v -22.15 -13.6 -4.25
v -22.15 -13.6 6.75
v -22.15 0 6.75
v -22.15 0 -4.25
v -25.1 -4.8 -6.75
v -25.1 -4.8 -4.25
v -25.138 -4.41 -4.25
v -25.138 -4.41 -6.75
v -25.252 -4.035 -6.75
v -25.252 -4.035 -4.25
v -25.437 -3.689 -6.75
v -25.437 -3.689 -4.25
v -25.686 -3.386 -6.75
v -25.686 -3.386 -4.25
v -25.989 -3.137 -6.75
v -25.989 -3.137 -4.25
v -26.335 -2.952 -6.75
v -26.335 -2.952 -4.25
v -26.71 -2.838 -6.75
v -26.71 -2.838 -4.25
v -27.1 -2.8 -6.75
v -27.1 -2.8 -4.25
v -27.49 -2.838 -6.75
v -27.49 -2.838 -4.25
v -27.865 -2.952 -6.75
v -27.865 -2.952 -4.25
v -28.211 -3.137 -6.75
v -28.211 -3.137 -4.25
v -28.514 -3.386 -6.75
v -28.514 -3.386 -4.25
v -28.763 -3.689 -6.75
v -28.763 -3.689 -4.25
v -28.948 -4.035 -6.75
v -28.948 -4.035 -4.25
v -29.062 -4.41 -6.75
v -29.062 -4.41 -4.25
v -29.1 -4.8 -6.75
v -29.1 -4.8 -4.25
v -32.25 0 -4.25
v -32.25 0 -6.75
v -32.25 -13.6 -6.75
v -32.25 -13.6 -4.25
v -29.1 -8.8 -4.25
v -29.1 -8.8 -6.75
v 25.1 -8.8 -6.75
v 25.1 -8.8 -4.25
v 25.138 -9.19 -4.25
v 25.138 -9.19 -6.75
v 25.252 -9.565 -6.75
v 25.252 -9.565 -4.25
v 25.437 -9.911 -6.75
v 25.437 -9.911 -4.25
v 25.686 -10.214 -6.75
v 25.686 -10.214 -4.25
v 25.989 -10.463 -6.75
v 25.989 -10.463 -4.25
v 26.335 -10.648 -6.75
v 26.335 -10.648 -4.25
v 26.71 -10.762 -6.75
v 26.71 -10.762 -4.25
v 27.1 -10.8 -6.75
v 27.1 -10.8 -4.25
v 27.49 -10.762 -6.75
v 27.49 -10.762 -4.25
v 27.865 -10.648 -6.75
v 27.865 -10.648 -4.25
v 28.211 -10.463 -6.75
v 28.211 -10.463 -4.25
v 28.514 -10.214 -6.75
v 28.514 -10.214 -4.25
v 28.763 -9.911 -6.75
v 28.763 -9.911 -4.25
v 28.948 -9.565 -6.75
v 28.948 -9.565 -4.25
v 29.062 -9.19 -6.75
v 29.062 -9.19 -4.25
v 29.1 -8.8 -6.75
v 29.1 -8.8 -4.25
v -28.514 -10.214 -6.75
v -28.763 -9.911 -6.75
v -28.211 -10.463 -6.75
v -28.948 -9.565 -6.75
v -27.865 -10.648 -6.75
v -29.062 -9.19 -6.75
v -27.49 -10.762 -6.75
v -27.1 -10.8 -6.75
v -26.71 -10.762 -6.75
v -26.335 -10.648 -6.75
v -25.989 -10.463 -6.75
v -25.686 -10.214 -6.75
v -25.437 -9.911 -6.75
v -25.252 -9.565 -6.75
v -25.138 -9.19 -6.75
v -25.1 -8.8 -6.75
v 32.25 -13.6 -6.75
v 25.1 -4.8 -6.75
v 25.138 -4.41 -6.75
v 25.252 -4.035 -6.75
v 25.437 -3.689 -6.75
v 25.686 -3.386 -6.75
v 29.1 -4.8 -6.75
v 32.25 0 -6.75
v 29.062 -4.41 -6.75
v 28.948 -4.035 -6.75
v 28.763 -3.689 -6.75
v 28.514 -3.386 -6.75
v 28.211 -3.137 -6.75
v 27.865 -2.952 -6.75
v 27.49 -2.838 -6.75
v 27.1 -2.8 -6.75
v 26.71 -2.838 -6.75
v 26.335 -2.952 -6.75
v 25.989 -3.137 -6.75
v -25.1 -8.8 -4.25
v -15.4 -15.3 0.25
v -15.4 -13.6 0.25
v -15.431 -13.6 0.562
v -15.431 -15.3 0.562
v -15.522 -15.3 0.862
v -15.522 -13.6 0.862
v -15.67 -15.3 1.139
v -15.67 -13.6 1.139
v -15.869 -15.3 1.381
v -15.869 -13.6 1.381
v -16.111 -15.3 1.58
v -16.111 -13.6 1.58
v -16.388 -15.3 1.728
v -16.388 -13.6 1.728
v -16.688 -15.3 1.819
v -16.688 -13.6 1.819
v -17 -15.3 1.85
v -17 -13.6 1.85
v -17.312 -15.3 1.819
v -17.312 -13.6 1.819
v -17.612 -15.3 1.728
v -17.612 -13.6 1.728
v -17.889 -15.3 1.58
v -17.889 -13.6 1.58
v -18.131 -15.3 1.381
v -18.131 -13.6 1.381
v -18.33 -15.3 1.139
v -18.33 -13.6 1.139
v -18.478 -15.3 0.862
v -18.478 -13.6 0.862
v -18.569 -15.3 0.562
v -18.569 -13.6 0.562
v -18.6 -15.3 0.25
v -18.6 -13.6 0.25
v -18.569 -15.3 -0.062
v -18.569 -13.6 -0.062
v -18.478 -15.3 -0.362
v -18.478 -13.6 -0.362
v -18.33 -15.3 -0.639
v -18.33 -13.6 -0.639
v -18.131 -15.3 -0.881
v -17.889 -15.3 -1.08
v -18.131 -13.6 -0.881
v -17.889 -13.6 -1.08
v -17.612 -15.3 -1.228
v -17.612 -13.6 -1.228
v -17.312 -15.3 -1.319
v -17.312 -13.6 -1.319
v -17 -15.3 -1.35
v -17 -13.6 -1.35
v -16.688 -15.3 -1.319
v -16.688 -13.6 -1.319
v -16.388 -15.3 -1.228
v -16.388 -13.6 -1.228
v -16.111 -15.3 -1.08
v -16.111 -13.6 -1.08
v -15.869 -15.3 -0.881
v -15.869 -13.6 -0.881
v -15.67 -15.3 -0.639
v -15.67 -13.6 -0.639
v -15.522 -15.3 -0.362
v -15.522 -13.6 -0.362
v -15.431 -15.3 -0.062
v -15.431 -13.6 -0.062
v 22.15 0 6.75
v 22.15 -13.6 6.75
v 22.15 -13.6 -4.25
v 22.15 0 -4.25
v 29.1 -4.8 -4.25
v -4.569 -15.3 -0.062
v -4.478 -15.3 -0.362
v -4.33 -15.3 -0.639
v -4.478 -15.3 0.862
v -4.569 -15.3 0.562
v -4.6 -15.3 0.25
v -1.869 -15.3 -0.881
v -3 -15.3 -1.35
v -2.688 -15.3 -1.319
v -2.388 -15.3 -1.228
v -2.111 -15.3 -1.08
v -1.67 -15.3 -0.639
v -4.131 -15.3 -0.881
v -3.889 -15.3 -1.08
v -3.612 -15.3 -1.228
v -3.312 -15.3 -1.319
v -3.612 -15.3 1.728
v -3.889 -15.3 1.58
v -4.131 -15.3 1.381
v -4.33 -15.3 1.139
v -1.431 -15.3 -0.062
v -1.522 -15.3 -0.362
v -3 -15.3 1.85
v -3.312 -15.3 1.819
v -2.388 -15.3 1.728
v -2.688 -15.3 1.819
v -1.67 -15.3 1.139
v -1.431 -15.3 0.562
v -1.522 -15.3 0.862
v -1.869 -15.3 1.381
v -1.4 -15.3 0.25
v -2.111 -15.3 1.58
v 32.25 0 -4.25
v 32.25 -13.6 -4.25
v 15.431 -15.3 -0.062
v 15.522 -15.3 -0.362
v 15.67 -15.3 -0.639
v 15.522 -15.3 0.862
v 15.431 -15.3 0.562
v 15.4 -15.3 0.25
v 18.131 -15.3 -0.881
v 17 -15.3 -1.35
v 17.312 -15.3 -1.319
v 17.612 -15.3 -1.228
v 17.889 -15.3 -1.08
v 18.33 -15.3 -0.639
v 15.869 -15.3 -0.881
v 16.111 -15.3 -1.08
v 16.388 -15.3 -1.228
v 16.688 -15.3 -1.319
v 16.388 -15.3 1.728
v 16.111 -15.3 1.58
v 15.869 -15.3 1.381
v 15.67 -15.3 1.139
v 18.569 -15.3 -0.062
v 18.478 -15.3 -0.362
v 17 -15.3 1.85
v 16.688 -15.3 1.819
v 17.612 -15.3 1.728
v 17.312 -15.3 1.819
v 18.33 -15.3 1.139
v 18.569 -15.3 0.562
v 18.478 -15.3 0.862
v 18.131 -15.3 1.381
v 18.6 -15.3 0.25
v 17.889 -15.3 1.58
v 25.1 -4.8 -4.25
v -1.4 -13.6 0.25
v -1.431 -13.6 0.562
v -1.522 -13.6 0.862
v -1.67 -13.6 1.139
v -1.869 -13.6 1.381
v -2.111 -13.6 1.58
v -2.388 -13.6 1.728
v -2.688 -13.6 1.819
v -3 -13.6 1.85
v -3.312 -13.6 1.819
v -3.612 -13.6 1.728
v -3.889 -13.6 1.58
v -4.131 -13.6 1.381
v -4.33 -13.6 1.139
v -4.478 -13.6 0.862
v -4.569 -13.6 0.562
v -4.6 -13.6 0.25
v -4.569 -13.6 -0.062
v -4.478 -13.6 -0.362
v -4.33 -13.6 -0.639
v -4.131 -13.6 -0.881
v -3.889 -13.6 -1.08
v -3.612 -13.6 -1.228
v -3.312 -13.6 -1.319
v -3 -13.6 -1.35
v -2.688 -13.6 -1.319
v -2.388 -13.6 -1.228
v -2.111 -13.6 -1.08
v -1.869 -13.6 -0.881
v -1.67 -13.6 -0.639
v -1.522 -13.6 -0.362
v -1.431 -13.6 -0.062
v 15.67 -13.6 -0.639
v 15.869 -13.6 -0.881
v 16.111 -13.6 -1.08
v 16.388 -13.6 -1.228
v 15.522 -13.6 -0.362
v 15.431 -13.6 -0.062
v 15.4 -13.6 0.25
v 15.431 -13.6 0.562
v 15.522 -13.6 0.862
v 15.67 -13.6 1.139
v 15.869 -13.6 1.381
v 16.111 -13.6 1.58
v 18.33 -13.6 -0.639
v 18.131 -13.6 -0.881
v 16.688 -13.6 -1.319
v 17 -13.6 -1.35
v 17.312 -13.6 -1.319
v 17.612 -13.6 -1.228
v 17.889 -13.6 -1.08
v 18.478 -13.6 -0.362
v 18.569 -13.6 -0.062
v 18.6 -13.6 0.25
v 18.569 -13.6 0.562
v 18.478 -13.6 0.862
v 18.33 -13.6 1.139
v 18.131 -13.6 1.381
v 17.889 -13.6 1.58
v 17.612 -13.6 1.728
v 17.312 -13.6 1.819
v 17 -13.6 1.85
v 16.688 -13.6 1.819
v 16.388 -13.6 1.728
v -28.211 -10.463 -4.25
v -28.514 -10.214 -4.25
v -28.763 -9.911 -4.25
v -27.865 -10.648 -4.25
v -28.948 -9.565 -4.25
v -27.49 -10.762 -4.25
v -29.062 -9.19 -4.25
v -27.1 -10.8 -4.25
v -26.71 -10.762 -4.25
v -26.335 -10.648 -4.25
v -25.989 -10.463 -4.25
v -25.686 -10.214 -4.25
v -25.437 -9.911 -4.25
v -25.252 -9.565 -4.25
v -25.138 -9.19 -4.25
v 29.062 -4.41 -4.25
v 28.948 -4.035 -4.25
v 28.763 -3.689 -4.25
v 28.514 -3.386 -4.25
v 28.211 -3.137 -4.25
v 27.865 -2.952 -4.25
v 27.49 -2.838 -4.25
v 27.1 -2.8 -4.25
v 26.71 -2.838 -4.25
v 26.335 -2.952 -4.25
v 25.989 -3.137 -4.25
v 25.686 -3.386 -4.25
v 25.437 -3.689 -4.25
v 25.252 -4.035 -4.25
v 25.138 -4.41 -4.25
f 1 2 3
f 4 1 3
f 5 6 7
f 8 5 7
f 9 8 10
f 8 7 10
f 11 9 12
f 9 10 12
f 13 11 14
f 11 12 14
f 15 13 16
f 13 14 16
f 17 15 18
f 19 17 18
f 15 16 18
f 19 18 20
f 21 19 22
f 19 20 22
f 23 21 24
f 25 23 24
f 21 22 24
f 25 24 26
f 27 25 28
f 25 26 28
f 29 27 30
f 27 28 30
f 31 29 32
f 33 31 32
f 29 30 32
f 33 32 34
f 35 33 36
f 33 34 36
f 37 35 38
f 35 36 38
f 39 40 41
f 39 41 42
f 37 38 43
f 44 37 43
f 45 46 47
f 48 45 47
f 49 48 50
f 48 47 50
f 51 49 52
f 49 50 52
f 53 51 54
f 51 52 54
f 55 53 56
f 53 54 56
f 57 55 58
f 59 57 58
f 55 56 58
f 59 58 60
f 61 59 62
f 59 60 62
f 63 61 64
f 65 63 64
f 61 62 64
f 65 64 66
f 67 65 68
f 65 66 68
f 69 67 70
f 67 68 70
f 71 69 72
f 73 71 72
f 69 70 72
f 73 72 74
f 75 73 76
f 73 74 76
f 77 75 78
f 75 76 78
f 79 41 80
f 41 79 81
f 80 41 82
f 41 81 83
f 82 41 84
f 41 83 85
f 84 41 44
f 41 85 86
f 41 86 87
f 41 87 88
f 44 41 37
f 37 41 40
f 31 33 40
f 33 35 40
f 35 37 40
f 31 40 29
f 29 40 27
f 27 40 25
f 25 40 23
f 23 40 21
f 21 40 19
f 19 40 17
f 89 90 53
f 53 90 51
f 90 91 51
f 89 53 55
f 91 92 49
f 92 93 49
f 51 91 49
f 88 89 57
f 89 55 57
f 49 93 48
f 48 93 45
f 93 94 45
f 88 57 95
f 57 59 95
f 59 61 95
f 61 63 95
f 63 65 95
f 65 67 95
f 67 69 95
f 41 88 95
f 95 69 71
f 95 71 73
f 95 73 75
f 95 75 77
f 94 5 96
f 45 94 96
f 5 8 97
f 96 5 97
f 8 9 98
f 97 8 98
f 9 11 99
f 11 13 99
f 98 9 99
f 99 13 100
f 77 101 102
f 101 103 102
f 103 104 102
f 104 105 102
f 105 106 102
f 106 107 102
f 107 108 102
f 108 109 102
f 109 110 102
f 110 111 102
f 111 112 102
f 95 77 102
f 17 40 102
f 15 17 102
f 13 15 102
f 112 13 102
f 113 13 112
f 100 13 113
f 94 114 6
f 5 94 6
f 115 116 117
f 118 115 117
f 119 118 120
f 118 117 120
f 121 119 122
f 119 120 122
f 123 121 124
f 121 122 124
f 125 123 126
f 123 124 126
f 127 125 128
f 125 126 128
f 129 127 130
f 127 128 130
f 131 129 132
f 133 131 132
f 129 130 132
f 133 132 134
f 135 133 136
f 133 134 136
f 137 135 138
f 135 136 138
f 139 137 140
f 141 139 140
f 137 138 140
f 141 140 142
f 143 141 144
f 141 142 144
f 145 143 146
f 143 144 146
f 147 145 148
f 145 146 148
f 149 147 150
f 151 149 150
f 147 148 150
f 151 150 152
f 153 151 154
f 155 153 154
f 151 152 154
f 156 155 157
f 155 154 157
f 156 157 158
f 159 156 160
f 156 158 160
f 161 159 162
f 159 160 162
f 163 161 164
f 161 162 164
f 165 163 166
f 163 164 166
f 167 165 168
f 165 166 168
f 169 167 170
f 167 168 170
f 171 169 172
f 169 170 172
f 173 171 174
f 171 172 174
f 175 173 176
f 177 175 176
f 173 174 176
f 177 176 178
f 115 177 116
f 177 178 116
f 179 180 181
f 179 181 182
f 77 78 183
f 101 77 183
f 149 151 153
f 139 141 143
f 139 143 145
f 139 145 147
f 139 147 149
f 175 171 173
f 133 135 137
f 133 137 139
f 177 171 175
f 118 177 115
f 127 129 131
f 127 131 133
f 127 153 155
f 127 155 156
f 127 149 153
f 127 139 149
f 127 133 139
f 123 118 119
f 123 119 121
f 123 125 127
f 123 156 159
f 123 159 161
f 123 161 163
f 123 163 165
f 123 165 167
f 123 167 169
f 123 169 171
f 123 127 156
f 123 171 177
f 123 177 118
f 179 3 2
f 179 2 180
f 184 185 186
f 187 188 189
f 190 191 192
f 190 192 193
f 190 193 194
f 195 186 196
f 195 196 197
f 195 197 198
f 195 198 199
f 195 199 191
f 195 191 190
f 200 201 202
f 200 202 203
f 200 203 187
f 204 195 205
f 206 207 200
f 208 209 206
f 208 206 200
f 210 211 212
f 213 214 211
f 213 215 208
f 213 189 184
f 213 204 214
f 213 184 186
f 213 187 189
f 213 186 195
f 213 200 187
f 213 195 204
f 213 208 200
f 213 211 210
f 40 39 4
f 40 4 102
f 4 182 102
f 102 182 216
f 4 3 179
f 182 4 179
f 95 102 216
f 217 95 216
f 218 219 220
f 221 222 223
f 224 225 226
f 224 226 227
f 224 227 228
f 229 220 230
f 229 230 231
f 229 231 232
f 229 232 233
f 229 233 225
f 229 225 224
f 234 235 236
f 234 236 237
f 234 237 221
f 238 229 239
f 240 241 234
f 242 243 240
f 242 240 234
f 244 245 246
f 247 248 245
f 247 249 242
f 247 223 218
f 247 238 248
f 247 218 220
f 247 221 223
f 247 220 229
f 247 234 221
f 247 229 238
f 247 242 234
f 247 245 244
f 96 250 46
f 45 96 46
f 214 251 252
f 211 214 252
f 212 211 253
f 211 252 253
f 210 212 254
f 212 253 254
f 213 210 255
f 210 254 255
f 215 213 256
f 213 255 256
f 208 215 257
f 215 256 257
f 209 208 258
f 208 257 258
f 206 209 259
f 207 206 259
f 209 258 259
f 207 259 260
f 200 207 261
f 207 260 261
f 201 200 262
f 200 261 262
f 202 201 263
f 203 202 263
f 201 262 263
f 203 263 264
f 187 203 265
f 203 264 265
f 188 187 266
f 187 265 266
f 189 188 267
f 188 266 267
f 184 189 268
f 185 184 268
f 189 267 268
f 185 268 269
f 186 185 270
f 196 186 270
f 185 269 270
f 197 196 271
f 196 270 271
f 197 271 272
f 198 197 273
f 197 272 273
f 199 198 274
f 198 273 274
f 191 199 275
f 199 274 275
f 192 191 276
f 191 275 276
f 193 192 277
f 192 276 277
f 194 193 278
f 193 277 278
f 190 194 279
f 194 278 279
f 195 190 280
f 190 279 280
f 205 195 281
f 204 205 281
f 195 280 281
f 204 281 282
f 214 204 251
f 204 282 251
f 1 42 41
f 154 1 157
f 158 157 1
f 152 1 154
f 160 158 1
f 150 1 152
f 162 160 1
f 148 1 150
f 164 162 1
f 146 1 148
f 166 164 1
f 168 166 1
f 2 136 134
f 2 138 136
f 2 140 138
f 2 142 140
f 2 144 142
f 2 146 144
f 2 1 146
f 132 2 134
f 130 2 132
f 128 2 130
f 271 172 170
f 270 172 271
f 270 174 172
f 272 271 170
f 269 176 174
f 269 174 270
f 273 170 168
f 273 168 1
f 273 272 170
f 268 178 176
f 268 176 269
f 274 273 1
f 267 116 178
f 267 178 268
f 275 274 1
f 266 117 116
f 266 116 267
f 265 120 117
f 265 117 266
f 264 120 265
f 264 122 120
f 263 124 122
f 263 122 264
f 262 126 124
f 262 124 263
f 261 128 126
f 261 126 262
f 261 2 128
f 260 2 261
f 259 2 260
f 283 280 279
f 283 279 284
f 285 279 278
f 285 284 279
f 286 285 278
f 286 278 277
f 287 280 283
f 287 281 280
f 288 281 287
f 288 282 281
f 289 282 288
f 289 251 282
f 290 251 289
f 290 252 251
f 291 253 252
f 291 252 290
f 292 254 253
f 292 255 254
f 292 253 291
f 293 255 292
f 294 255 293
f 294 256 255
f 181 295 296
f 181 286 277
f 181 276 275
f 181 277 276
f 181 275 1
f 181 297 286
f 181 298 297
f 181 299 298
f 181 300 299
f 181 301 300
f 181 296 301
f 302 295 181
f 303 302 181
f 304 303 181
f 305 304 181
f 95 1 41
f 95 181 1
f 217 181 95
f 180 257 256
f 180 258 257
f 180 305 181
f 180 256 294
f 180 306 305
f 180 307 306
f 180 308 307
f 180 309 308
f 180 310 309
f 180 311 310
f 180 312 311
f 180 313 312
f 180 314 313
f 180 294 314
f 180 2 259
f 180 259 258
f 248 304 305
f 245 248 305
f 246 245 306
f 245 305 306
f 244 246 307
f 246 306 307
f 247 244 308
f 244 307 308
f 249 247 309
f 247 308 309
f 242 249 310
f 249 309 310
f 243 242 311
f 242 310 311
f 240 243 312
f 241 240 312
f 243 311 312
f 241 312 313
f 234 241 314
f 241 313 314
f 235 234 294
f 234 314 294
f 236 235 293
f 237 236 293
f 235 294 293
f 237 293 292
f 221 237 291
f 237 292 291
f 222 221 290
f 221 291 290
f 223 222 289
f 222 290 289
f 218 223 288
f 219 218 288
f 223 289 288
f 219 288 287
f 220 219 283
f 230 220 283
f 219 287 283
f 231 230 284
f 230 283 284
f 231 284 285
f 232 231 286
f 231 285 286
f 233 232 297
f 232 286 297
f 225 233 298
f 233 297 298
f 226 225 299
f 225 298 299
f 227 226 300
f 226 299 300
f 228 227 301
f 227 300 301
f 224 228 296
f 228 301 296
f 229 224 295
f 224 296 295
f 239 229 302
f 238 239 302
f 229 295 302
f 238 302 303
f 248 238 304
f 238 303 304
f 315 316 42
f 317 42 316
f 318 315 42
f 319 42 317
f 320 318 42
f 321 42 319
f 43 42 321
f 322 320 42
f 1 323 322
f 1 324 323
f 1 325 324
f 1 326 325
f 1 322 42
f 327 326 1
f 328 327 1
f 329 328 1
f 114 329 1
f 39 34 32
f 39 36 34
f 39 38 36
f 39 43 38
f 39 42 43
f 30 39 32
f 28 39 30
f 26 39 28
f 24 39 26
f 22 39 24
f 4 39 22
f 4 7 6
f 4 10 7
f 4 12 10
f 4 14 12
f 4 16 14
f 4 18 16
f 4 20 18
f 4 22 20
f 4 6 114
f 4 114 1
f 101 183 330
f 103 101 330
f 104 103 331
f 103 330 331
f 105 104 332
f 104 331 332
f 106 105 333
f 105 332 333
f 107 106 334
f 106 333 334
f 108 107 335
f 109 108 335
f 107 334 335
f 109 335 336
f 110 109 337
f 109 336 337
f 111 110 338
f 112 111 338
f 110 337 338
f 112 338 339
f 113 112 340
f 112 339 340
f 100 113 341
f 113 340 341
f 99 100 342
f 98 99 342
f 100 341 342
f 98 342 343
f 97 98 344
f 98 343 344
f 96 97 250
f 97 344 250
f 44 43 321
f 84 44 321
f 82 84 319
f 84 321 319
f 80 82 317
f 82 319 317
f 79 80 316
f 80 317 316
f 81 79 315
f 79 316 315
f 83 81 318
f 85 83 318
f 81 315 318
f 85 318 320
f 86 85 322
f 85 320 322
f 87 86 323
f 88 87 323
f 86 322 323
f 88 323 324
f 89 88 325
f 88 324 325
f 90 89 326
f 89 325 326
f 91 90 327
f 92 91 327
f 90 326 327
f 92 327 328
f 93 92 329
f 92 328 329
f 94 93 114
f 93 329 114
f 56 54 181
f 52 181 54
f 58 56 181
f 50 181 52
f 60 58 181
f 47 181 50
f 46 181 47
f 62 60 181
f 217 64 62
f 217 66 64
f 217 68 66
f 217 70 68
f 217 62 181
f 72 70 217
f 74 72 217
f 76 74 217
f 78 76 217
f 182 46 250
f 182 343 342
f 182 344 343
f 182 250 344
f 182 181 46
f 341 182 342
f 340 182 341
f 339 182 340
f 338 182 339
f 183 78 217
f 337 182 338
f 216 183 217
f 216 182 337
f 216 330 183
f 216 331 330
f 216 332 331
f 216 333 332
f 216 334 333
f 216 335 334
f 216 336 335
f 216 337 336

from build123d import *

# Parameters (mm, degrees)
F0_W     = 64.5
F0_H     = 13.5
F1_DEPTH = 13.6
F2_W     = 10.1
F2_H     = 13.6
F3_DEPTH = 11
F4_R     = 1.6
F5_DEPTH = 1.7
F7_DEPTH = 25


with BuildPart() as f1:
    # F0 (on Front) → F1 (new body)
    with BuildSketch(Plane.XZ):
        Rectangle(F0_W, F0_H)
    extrude(amount=F1_DEPTH)

    # F2 (on face) → F3 (cut)
    with BuildSketch(Plane.XY.offset(6.75)):
        with Locations((-27.2, -6.8)):
            Rectangle(F2_W, F2_H)
        with Locations((27.2, -6.8)):
            Rectangle(F2_W, F2_H)
    extrude(amount=-F3_DEPTH, mode=Mode.SUBTRACT)

    # F4 (on face) → F5 (join)
    with BuildSketch(Plane.XZ.offset(13.6)):
        with Locations((17, 0.25)):
            Circle(F4_R)
        with Locations((-3, 0.25)):
            Circle(F4_R)
        with Locations((-17, 0.25)):
            Circle(F4_R)
    extrude(amount=F5_DEPTH)

    # F6 (on face) → F7 (cut)
    with BuildSketch(Plane.XY.offset(-4.25)):
        with BuildLine():
            ThreePointArc((-25.1, -4.8), (-27.1, -2.8), (-29.1, -4.8))
            Line((-29.1, -4.8), (-29.1, -6.8))
            Line((-29.1, -6.8), (-29.1, -8.8))
            ThreePointArc((-29.1, -8.8), (-27.1, -10.8), (-25.1, -8.8))
            Line((-25.1, -8.8), (-25.1, -6.8))
            Line((-25.1, -6.8), (-25.1, -4.8))
        make_face()
        with BuildLine():
            Line((29.1, -8.8), (29.1, -4.8))
            ThreePointArc((29.1, -4.8), (27.1, -2.8), (25.1, -4.8))
            Line((25.1, -4.8), (25.1, -8.8))
            ThreePointArc((25.1, -8.8), (27.1, -10.8), (29.1, -8.8))
        make_face()
    extrude(amount=-F7_DEPTH, mode=Mode.SUBTRACT)


solid = f1.part
